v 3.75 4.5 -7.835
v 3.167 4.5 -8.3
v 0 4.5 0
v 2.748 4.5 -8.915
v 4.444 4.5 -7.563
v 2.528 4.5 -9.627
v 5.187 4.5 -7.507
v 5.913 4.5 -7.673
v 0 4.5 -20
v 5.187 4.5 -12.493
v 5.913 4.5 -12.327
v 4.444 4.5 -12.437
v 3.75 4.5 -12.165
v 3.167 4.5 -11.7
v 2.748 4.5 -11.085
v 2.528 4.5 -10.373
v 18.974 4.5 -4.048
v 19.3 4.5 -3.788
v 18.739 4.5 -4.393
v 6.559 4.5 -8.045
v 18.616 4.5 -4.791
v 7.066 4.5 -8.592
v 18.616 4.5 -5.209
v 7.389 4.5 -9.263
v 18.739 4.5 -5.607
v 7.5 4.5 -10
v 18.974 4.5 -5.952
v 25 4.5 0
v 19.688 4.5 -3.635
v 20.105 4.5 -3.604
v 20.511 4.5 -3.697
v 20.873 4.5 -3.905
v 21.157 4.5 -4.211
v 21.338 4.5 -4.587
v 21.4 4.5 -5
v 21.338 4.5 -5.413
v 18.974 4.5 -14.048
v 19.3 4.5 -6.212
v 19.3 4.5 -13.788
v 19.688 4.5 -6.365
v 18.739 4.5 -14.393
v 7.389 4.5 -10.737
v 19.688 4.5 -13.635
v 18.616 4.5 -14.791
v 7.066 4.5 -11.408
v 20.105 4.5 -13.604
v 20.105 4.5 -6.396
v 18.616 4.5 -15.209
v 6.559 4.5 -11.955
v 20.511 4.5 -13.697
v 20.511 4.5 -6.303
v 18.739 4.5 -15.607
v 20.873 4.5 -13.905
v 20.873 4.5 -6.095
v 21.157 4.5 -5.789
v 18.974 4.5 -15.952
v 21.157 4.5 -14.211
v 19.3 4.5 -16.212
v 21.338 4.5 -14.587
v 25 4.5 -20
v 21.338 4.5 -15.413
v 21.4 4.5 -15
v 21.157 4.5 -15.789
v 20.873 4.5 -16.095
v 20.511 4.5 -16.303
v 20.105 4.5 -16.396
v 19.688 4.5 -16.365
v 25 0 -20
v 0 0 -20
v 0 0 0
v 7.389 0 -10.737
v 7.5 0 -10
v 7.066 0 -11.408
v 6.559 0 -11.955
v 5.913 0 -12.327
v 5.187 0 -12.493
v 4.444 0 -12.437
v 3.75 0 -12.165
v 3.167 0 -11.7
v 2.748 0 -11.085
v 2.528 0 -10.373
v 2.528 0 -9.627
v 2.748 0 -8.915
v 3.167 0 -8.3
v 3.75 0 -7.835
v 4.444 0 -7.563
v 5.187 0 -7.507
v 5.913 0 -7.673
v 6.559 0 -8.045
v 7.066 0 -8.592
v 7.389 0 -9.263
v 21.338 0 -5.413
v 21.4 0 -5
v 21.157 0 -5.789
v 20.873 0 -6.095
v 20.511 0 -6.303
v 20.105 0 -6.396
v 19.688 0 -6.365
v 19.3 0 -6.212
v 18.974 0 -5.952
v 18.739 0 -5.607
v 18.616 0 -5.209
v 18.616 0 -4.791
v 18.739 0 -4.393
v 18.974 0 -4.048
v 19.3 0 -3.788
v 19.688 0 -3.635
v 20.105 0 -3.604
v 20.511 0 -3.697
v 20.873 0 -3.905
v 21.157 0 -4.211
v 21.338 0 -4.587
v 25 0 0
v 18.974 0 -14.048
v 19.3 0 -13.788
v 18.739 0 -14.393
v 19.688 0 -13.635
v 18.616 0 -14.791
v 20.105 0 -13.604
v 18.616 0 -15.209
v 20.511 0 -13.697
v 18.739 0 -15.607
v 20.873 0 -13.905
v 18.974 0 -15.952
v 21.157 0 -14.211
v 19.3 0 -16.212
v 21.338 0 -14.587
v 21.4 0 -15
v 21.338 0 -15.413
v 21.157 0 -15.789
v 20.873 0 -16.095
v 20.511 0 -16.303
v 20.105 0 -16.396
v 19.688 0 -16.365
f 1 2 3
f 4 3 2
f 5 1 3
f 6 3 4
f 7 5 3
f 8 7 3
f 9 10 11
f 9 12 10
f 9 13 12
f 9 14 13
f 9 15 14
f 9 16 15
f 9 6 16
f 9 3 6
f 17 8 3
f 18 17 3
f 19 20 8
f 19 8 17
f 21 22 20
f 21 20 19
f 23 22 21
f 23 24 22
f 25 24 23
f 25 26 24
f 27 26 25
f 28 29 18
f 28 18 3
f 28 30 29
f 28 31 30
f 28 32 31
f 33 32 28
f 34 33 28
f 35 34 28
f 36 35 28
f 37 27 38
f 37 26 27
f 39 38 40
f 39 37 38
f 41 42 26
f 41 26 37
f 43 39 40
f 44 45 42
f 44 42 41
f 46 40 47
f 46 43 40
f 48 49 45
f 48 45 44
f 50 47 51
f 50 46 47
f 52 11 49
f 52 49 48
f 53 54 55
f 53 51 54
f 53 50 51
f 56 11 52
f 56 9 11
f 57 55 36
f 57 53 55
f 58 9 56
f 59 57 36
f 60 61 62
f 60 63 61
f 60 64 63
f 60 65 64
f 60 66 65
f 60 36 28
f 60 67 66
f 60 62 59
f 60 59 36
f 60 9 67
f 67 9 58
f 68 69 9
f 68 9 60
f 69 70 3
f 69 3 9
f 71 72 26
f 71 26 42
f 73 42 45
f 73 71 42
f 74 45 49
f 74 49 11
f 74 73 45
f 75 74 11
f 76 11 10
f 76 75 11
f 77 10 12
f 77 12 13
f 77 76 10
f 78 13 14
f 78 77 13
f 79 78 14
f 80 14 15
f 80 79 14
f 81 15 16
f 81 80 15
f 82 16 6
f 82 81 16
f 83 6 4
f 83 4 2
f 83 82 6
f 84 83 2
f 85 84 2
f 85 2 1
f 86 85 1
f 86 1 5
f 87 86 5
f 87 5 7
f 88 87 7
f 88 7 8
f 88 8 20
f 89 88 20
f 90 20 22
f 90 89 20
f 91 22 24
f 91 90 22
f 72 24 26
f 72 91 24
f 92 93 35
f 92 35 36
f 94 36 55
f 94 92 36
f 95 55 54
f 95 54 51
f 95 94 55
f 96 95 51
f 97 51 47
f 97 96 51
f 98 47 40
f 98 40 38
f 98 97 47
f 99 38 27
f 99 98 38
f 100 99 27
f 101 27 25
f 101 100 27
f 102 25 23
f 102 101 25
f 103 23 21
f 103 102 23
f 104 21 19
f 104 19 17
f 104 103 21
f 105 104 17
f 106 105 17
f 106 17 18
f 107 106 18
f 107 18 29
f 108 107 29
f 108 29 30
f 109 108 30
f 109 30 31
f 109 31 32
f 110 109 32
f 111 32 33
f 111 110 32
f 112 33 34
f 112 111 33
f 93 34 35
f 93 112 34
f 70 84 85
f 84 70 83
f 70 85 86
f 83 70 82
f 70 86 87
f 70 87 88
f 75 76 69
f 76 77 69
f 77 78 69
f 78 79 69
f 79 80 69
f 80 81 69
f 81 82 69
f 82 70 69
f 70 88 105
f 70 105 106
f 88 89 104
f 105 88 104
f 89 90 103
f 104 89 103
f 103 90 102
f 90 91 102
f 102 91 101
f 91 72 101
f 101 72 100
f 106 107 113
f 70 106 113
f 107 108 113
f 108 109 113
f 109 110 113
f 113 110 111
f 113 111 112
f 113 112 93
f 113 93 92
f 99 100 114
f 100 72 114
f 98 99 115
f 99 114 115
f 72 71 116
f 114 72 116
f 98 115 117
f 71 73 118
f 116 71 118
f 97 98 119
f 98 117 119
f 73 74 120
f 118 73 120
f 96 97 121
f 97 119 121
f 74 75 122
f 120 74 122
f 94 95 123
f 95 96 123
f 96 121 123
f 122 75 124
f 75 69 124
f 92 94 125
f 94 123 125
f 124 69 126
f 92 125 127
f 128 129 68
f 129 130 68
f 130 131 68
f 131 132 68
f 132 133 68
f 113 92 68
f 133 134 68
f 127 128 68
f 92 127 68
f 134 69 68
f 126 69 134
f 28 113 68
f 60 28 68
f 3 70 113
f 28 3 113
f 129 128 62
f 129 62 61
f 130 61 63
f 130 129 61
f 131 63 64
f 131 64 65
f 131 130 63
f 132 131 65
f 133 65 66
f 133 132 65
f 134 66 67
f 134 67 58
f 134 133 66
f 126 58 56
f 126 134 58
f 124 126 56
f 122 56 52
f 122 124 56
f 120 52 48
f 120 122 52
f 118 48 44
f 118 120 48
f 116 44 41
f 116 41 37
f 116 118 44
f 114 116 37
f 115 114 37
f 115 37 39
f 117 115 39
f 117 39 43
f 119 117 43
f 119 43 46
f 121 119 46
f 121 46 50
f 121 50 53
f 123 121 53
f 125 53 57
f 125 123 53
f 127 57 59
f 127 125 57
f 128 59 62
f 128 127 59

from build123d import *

# Parameters (mm, degrees)
SKETCH1_W           = 25
SKETCH1_H           = 20
BOSS_EXTRUDE1_DEPTH = 4.5
SKETCH1_4_R         = 2.5
SKETCH1_4_R_2       = 1.4
CUT_EXTRUDE1_DEPTH  = 4.5


with BuildPart() as part:
    # Sketch1 → Boss-Extrude1 (new body)
    with BuildSketch(Plane(origin=(0, 0, 0), x_dir=(1, 0, 0), z_dir=(0, 1, 0))):
        with Locations((12.5, 10)):
            Rectangle(SKETCH1_W, SKETCH1_H)
    extrude(amount=BOSS_EXTRUDE1_DEPTH)

    # Sketch1<4> → Cut-Extrude1 (cut)
    with BuildSketch(Plane(origin=(0, 0, 0), x_dir=(1, 0, 0), z_dir=(0, 1, 0))):
        with Locations((5, 10)):
            Circle(SKETCH1_4_R)
        with Locations((20, 15)):
            Circle(SKETCH1_4_R_2)
        with Locations((20, 5)):
            Circle(SKETCH1_4_R_2)
    extrude(amount=CUT_EXTRUDE1_DEPTH, mode=Mode.SUBTRACT)


solid = part.part
